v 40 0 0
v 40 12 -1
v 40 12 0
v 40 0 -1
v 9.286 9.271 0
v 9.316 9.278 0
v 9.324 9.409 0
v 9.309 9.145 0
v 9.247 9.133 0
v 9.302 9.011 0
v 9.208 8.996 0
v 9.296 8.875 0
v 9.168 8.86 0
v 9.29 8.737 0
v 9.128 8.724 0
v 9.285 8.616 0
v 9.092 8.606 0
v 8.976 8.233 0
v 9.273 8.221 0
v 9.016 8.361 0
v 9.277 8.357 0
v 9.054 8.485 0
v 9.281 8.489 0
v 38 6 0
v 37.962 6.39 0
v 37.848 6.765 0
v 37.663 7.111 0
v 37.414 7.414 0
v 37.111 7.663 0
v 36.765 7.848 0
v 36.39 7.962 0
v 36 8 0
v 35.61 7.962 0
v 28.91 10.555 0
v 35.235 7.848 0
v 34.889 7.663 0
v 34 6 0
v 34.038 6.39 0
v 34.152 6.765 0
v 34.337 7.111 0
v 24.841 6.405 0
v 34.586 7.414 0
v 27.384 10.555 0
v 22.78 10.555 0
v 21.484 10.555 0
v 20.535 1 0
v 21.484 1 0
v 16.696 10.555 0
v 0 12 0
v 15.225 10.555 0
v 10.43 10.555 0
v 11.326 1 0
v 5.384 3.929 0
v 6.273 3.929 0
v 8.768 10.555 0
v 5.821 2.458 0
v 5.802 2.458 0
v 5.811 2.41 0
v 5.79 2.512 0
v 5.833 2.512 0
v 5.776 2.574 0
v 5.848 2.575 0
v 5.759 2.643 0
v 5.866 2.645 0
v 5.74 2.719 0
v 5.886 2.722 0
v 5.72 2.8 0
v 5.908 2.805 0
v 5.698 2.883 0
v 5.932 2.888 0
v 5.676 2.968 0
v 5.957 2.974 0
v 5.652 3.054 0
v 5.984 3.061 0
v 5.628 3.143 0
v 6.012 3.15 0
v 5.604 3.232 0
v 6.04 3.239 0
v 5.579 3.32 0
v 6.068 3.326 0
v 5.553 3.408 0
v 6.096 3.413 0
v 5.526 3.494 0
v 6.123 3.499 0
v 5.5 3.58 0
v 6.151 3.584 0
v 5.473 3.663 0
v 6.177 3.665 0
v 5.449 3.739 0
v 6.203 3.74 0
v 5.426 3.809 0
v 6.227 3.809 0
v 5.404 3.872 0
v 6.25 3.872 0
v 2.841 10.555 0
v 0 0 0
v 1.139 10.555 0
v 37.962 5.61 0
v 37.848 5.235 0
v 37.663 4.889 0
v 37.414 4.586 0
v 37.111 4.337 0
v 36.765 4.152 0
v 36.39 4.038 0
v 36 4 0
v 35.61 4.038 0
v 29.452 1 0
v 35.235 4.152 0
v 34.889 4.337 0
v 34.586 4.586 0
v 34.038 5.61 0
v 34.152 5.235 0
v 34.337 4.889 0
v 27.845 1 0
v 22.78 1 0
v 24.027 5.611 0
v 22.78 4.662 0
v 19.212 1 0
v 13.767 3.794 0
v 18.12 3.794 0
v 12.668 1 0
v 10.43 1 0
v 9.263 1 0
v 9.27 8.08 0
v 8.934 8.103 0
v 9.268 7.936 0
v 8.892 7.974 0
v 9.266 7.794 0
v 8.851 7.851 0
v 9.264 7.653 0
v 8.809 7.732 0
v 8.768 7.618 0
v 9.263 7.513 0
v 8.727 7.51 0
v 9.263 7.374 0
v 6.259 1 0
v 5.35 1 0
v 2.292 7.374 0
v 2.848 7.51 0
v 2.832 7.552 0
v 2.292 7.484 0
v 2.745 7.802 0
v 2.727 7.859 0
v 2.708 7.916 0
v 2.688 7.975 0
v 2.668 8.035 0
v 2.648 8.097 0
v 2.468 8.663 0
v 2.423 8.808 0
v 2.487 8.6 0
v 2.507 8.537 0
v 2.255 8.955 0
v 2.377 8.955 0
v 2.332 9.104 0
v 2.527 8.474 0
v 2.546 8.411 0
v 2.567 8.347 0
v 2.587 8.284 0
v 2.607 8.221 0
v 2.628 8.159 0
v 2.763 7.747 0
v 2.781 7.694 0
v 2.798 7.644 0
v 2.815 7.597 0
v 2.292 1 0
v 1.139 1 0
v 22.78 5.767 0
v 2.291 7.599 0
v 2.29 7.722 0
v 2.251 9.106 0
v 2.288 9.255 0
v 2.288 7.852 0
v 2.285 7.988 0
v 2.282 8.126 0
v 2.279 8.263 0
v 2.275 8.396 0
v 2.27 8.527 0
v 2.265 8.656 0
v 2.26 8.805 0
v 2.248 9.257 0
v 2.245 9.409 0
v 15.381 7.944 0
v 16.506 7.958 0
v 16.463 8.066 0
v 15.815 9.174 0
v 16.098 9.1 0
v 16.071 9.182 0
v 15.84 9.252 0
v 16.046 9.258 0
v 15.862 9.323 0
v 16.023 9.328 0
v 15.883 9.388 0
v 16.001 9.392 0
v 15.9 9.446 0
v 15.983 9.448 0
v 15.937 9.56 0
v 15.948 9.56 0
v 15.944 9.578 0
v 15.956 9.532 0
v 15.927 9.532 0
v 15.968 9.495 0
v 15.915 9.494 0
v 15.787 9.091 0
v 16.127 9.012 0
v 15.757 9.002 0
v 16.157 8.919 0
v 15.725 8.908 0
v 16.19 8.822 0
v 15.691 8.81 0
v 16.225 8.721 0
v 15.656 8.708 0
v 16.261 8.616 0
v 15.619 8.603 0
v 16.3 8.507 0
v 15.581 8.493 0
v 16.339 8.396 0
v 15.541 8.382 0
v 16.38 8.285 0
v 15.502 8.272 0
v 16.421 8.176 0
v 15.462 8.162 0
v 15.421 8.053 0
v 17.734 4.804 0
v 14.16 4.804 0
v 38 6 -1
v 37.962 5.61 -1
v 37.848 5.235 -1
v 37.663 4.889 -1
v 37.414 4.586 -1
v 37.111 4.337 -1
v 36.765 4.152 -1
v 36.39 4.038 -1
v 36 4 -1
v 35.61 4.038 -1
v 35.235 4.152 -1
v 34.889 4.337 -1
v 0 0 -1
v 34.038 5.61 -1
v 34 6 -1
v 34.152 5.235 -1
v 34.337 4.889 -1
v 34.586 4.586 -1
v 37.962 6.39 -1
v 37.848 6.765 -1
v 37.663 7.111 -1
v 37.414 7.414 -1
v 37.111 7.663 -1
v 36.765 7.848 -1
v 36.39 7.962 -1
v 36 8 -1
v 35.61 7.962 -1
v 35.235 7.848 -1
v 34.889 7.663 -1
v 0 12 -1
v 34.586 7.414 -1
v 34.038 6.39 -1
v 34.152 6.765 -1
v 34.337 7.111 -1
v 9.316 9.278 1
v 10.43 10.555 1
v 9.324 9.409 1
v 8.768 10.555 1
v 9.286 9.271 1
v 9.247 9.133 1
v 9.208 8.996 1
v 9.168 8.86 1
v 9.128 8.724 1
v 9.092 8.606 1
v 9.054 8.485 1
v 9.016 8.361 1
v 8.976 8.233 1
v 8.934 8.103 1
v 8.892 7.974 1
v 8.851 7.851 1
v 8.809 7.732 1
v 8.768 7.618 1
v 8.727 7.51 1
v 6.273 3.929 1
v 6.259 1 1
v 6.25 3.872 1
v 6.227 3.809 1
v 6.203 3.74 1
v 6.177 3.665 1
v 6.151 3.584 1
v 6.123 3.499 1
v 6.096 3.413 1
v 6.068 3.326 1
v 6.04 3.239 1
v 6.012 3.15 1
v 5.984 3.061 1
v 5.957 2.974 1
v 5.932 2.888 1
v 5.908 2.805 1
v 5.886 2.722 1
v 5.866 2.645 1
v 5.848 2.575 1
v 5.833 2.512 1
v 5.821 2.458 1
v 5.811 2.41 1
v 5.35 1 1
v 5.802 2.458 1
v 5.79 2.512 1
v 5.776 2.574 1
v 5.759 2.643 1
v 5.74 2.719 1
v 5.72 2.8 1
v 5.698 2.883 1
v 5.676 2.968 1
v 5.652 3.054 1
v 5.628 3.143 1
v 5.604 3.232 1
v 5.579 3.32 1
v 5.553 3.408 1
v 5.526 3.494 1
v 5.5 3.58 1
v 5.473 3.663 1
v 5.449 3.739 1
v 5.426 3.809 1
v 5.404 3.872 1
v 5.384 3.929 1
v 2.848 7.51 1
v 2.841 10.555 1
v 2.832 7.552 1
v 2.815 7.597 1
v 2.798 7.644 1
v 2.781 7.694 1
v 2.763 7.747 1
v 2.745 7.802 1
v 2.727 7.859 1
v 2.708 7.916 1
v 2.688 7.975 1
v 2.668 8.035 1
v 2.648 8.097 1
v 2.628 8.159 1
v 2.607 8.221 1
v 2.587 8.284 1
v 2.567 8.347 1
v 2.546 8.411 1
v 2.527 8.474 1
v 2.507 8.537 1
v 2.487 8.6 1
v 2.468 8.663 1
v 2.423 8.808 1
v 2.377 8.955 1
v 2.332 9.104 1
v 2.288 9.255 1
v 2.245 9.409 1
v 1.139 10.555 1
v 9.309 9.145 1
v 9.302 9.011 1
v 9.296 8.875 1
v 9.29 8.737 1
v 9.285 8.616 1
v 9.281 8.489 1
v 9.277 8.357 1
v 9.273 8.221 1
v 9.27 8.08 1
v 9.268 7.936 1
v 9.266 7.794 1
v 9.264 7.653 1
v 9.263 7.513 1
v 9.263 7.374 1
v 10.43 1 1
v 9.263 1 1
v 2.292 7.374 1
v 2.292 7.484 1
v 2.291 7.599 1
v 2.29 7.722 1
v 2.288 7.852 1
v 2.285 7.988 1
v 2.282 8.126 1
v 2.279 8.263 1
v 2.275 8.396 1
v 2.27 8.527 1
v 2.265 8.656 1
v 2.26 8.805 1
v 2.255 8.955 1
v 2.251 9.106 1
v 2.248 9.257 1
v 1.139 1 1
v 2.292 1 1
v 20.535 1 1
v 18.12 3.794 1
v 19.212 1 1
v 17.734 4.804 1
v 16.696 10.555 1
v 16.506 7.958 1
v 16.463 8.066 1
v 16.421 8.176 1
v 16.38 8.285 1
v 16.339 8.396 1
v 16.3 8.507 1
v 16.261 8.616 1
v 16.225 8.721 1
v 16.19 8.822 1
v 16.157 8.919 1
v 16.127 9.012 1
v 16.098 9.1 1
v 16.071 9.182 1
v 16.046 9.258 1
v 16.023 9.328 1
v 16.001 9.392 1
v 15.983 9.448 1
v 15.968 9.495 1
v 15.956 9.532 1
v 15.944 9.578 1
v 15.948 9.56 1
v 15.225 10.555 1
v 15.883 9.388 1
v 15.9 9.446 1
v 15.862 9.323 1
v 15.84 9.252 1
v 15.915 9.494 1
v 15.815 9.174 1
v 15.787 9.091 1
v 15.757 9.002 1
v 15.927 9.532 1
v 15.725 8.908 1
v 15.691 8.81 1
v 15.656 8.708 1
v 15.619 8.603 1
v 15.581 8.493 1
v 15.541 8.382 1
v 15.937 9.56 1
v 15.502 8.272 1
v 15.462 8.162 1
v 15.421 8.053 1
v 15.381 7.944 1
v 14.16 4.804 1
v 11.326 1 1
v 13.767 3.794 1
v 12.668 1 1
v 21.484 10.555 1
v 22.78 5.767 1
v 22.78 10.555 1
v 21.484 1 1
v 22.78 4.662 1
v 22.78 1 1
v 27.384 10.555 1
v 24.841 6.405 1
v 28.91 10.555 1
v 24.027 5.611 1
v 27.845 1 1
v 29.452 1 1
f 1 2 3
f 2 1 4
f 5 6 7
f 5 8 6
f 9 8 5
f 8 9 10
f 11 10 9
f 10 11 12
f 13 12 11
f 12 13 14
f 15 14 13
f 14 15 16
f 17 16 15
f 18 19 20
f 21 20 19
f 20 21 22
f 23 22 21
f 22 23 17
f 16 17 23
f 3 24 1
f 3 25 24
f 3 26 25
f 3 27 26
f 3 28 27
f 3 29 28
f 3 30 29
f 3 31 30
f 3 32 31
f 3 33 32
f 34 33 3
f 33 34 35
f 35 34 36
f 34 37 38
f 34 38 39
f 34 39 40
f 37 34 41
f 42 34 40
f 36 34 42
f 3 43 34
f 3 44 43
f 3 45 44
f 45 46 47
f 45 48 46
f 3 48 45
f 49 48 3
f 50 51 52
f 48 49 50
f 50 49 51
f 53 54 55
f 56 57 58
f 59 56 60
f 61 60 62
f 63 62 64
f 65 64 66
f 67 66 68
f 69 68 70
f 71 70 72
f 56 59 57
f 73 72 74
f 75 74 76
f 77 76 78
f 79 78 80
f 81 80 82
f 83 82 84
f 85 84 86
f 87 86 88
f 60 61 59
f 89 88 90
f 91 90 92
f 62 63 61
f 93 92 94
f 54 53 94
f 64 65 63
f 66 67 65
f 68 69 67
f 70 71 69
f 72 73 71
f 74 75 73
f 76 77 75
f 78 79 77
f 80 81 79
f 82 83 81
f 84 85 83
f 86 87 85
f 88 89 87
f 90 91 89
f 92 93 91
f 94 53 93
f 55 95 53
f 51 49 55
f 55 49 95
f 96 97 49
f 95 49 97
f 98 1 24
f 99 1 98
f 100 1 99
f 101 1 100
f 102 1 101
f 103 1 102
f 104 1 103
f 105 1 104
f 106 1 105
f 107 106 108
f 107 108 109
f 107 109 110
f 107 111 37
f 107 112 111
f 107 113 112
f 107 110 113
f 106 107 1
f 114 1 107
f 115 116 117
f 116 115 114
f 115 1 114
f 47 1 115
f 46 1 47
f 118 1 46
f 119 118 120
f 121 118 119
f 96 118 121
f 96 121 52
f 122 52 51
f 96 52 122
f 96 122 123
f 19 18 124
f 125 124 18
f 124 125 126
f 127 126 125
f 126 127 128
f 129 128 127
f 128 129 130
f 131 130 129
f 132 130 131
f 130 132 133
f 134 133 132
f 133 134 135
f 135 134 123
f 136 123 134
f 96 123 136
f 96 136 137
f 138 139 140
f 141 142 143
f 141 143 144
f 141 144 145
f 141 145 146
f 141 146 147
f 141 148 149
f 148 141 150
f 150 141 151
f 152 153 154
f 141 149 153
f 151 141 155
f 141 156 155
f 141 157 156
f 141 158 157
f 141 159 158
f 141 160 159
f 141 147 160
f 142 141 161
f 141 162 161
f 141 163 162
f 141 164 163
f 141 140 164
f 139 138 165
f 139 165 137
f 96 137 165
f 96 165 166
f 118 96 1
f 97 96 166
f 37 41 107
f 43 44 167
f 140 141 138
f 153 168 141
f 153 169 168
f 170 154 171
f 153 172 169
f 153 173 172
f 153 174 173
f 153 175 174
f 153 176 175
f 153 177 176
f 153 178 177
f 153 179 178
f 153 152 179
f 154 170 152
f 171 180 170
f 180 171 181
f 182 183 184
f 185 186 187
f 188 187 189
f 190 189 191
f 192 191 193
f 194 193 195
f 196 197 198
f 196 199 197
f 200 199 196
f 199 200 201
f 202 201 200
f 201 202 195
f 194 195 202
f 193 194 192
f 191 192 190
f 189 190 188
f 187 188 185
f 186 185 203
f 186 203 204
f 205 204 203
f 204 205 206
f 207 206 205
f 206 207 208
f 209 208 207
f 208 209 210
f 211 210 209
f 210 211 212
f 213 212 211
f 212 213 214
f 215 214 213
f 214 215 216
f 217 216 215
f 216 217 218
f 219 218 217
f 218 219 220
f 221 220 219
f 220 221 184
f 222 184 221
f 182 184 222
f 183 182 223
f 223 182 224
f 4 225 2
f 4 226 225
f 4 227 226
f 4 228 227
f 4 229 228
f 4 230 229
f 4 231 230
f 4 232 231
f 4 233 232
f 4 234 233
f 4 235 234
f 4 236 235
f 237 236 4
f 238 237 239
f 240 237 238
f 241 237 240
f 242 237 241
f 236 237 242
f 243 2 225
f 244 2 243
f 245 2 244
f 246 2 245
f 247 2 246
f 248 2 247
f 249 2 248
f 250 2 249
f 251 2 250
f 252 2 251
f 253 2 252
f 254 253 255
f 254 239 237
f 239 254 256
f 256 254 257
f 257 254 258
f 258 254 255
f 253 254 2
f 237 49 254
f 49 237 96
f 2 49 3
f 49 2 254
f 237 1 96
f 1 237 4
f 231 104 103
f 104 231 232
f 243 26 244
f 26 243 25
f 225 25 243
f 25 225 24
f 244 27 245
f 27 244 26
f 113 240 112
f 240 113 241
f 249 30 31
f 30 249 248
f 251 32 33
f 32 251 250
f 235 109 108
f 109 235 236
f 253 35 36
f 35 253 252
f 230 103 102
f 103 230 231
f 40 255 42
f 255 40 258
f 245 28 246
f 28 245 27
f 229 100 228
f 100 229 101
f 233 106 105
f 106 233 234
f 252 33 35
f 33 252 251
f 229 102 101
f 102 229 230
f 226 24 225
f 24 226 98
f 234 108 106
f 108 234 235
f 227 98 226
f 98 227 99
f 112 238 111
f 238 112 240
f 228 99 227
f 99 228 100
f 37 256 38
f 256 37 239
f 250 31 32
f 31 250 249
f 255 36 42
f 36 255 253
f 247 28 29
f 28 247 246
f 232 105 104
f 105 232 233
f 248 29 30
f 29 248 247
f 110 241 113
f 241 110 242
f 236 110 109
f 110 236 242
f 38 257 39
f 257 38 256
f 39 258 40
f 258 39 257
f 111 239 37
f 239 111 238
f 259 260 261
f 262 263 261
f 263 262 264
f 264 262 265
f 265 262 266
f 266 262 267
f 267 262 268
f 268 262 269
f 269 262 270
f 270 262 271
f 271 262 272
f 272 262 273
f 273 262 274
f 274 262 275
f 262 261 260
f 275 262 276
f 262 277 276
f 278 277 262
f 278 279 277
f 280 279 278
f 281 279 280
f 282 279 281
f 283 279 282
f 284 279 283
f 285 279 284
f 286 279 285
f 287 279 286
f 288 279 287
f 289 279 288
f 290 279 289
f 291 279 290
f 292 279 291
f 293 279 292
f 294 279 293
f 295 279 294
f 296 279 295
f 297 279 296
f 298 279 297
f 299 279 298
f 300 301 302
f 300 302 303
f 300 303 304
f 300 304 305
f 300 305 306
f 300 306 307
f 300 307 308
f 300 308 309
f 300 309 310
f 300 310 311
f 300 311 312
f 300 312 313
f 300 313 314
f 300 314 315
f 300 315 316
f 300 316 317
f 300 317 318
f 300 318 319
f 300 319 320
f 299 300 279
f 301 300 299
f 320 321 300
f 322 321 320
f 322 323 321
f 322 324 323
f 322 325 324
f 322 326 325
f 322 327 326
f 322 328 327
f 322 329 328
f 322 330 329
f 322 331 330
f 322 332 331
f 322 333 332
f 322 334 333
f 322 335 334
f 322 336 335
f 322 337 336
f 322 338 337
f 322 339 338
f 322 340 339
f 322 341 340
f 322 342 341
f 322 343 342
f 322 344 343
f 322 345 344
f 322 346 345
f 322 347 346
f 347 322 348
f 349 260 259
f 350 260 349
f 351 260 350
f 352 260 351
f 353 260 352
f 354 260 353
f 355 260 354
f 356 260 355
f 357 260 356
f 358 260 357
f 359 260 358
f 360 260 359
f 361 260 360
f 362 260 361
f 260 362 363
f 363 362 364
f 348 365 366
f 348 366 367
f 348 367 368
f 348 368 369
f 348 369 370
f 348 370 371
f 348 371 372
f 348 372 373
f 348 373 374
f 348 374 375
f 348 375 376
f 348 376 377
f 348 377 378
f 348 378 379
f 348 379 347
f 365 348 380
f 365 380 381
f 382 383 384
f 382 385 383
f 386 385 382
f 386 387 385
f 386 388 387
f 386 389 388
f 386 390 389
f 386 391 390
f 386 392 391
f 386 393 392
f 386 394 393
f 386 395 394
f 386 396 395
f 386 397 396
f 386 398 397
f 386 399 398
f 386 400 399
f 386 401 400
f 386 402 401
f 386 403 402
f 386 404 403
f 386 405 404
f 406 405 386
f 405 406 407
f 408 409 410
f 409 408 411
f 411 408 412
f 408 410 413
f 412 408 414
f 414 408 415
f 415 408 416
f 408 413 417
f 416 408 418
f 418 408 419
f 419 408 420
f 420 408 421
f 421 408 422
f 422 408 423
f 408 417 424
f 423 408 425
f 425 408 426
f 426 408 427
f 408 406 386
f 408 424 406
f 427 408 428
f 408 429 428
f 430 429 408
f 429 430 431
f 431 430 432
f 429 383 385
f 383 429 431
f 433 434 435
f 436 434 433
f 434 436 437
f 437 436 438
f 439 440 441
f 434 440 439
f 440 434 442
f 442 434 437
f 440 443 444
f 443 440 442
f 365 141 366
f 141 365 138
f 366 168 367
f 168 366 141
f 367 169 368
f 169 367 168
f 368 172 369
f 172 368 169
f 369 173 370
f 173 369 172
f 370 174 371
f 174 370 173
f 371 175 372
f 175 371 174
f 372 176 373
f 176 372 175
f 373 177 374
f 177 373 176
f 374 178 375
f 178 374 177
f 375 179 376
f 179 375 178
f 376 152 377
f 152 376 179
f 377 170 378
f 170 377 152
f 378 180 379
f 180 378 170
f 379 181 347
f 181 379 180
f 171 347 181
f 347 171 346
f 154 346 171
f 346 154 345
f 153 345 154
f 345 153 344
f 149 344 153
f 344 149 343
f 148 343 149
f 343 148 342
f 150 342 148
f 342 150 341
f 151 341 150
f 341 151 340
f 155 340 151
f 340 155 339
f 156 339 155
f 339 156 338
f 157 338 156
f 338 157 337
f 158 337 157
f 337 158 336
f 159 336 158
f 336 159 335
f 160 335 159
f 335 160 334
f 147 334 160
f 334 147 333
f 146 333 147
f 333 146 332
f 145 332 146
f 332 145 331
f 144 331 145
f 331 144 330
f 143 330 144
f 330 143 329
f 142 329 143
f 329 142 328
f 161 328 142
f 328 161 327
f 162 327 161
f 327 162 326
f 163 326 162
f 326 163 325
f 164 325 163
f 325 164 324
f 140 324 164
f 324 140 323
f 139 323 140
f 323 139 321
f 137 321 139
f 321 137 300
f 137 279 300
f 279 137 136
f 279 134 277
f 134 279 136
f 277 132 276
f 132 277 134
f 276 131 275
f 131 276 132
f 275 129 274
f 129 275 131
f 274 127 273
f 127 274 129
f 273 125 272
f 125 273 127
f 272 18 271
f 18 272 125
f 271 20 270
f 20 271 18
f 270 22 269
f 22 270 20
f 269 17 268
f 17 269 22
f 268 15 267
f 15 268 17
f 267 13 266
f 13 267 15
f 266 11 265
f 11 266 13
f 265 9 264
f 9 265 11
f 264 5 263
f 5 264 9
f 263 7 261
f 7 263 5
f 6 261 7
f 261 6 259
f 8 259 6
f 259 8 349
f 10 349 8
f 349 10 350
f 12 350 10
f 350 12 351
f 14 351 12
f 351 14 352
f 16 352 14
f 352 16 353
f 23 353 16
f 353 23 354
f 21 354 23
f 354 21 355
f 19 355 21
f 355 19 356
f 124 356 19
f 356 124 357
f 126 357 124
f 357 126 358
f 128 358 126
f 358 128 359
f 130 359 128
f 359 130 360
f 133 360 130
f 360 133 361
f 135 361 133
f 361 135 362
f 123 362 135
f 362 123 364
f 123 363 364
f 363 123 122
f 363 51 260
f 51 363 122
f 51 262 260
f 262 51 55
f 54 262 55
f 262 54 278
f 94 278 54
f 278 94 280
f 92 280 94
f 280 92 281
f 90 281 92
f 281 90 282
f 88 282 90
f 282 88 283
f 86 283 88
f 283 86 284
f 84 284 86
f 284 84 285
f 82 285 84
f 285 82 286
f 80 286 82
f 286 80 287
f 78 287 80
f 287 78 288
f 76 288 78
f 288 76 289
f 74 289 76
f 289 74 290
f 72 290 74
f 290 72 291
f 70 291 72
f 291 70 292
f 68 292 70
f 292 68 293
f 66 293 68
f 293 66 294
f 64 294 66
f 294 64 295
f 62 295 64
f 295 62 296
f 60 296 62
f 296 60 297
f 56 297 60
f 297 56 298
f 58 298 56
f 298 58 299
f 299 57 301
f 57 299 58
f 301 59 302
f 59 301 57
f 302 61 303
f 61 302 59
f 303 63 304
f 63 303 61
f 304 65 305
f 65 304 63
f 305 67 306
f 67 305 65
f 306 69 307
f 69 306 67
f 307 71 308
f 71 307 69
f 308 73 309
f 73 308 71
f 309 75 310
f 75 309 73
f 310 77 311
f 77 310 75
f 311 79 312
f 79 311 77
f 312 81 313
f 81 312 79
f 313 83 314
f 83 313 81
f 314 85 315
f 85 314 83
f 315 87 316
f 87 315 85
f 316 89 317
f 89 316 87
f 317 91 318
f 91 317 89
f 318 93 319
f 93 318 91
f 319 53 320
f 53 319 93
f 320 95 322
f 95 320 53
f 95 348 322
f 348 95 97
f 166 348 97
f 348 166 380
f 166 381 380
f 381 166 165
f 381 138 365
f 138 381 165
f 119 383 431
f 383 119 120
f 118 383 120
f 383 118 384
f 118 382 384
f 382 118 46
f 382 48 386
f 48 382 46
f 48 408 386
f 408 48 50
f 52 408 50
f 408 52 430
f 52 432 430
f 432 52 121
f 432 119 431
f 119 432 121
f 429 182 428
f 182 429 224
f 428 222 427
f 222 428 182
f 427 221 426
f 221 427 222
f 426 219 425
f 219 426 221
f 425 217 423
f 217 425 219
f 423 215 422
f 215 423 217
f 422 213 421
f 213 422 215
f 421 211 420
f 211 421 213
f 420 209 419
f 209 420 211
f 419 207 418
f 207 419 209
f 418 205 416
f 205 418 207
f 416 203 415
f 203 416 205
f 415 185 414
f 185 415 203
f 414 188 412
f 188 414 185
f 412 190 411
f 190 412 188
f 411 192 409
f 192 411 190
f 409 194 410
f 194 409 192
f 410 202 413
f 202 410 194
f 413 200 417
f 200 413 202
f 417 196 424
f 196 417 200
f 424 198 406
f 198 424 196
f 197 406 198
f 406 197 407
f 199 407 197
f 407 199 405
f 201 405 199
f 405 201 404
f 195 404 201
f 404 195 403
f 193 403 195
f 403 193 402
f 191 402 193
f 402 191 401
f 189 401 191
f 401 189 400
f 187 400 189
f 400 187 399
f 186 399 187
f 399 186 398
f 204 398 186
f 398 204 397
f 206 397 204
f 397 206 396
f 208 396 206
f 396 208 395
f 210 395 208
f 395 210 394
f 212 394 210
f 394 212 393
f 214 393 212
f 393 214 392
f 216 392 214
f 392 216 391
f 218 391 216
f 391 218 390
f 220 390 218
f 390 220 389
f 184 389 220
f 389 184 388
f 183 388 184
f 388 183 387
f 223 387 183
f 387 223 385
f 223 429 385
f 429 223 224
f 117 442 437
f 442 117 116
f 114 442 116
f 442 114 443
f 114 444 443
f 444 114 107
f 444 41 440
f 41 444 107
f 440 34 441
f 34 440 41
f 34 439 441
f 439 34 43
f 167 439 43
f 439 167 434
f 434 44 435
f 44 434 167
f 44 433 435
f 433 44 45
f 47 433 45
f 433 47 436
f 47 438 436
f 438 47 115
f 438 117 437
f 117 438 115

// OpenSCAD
myInitials = "MAK";

union() {
    translate([0,1,0])linear_extrude(1) {
        text(myInitials,$fn=32);
    };
    difference() {
        translate([0,0,-1])cube([40,12,1]);
        translate([36,6,-2])cylinder(r=2,h=5,$fn=32);
    };
};
